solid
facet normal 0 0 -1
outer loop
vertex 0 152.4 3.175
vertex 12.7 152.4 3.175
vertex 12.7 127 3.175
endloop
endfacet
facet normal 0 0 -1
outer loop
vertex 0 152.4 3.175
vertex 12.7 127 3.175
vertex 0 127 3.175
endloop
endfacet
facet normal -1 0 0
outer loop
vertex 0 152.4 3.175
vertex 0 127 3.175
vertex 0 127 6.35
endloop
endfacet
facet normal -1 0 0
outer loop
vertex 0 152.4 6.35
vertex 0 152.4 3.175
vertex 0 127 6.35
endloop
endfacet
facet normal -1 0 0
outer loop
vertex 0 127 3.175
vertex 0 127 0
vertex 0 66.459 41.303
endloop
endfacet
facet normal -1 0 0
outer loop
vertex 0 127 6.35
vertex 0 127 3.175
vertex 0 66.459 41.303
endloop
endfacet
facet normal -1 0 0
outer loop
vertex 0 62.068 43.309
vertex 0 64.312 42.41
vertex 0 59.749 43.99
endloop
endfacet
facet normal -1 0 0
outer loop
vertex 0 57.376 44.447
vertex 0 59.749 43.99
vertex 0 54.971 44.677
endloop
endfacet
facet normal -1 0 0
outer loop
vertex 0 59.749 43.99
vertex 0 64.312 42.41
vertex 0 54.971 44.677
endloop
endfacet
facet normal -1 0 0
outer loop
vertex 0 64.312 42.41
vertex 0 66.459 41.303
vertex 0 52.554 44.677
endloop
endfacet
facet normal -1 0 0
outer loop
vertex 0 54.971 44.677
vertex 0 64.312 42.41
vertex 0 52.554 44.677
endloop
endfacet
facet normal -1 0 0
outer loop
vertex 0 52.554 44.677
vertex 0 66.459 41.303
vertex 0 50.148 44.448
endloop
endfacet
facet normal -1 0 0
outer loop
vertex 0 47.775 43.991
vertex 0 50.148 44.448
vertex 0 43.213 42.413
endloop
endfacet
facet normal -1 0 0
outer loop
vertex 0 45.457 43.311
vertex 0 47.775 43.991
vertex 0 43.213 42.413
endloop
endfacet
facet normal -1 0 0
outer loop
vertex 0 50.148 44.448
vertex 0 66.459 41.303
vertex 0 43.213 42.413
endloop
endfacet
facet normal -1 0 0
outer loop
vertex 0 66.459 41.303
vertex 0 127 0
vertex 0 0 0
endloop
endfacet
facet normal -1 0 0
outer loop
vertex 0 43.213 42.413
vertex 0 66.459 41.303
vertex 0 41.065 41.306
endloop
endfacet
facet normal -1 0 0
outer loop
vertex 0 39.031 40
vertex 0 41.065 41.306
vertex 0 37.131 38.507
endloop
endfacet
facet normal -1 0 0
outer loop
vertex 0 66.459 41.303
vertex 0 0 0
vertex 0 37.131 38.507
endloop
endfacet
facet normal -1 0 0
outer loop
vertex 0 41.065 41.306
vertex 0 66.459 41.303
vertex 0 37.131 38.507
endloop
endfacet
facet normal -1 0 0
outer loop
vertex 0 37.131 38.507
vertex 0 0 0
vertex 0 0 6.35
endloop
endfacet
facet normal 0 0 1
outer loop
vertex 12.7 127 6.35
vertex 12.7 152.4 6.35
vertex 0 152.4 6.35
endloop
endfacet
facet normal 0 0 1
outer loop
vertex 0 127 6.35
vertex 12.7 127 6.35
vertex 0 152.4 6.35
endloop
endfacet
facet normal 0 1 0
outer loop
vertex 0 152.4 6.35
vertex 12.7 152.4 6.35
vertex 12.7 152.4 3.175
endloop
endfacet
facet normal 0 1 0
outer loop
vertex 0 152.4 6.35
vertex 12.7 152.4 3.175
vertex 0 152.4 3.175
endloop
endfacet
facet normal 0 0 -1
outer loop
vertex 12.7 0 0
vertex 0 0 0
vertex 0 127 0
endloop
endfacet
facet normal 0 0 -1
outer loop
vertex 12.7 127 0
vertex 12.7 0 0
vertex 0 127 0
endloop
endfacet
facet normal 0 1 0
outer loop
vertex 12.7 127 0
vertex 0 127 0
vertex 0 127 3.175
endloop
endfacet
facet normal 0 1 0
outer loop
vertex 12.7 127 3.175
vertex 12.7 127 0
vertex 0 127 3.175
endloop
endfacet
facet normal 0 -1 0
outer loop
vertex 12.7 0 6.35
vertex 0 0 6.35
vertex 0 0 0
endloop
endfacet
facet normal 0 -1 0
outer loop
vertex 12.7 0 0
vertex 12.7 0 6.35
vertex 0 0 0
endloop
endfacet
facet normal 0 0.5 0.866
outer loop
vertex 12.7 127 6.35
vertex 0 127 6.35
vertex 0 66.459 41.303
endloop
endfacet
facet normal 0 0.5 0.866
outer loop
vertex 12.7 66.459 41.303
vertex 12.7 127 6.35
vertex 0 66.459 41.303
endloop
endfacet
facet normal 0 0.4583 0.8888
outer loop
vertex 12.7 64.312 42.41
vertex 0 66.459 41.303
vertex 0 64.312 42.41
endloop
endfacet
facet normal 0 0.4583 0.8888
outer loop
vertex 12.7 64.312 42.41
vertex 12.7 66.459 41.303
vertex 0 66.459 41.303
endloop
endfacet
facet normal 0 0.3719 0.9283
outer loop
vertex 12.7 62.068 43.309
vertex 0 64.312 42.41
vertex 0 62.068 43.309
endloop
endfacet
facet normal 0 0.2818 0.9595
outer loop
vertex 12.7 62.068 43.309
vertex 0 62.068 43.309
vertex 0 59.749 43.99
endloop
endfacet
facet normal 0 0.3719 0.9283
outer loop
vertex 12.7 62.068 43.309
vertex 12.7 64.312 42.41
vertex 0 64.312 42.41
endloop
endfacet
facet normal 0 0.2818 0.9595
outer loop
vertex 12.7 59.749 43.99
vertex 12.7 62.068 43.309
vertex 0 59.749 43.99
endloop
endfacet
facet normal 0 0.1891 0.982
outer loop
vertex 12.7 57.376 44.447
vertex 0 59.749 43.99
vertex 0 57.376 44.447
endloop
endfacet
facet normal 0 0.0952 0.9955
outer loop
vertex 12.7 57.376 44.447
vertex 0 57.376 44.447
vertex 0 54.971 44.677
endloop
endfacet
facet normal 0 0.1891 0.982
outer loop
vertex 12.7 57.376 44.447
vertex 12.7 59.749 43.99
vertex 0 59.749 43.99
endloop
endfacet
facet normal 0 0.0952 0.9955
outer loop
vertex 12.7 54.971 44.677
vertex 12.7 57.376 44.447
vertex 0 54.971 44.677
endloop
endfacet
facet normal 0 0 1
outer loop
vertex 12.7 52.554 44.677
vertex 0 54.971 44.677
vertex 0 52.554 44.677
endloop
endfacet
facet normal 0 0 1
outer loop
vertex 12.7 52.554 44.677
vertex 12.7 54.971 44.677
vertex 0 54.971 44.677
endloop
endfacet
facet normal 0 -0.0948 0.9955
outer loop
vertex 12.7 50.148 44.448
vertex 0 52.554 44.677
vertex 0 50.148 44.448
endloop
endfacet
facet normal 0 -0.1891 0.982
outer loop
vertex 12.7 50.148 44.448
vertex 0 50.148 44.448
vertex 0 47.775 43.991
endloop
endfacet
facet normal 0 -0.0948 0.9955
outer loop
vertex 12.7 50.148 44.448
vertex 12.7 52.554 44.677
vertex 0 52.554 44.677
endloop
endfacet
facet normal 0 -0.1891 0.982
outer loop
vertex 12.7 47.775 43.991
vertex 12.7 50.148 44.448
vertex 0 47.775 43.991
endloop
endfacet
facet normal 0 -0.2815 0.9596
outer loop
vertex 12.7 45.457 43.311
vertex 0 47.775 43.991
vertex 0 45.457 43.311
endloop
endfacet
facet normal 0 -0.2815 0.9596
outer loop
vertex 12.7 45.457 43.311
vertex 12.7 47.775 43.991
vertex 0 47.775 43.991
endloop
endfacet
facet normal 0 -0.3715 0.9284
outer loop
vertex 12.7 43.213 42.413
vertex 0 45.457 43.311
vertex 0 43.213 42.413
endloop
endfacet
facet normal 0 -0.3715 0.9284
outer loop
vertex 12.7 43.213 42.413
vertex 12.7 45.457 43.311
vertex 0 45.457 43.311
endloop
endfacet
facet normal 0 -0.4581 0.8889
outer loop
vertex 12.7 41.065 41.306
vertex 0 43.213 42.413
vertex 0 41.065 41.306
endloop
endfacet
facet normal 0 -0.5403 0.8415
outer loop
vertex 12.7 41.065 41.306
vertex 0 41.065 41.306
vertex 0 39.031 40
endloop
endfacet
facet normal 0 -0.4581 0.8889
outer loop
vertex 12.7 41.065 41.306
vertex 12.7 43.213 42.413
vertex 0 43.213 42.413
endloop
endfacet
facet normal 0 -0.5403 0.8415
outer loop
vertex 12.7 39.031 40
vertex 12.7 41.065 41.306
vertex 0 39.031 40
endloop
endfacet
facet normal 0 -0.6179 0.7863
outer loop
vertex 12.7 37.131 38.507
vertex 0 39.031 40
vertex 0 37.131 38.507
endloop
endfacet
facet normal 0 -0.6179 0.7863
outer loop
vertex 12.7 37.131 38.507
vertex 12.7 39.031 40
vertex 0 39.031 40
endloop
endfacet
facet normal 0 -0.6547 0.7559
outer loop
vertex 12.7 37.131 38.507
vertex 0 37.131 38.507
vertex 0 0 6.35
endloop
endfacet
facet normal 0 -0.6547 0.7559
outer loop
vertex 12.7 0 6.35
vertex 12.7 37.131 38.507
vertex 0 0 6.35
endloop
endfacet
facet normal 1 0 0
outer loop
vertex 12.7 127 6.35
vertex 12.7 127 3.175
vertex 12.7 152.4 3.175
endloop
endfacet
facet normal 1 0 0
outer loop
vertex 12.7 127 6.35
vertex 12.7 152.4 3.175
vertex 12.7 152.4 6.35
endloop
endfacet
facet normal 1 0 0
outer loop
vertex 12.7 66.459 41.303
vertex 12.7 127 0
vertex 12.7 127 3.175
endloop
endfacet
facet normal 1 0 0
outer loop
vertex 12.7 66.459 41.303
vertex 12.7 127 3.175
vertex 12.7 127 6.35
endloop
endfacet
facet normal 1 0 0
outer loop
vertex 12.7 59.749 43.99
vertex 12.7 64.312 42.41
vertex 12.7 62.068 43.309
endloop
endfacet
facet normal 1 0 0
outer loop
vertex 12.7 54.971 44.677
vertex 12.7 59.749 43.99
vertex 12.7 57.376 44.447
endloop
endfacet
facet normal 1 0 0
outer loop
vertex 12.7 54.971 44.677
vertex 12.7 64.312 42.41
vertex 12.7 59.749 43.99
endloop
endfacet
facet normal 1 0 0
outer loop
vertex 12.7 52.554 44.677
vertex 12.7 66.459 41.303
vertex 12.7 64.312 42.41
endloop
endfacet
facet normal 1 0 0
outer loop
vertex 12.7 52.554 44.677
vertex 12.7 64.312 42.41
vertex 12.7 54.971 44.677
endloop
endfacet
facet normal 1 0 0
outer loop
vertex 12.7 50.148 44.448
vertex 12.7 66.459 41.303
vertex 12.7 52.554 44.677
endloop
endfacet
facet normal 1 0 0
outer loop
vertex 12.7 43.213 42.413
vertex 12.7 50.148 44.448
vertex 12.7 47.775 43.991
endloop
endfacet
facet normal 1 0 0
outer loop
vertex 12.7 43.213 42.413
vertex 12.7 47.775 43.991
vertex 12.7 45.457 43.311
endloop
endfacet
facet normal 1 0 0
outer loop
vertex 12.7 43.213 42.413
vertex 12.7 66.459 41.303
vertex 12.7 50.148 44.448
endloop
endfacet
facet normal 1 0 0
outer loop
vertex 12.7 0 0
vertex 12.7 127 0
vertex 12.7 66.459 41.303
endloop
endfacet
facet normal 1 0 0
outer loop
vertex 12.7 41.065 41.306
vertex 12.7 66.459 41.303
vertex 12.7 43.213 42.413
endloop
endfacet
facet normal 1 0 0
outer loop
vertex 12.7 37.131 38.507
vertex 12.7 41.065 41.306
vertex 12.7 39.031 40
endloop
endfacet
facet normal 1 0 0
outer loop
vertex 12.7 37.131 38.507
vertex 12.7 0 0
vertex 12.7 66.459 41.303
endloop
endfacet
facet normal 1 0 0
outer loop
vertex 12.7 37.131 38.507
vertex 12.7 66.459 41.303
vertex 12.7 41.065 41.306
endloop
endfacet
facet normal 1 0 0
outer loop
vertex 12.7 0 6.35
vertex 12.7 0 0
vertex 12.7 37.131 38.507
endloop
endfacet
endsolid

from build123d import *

# Parameters (mm, degrees)
F1_DEPTH = 12.7
F2_R     = 25.4
F3_W     = 12.7
F3_H     = 3.175
F4_DEPTH = 25.4


with BuildPart() as f1:
    # F0 (on Right) → F1 (new body)
    with BuildSketch(Plane.YZ):
        Polygon((0, 6.35), (0, 0), (127, 0), (127, 6.35), (50.8, 50.344091), align=None)
    extrude(amount=F1_DEPTH)

    # F2
    f2_edges = [f1.edges().sort_by_distance(p)[0] for p in [
        (6.35, 50.8, 50.344091),
    ]]
    fillet(f2_edges, radius=F2_R)

    # F3 (on face) → F4 (join)
    with BuildSketch(Plane(origin=(0, 127, 0), x_dir=(-1, 0, 0), z_dir=(0, 1, 0))):
        with Locations((-6.35, 4.7625)):
            Rectangle(F3_W, F3_H)
    extrude(amount=F4_DEPTH)


solid = f1.part
